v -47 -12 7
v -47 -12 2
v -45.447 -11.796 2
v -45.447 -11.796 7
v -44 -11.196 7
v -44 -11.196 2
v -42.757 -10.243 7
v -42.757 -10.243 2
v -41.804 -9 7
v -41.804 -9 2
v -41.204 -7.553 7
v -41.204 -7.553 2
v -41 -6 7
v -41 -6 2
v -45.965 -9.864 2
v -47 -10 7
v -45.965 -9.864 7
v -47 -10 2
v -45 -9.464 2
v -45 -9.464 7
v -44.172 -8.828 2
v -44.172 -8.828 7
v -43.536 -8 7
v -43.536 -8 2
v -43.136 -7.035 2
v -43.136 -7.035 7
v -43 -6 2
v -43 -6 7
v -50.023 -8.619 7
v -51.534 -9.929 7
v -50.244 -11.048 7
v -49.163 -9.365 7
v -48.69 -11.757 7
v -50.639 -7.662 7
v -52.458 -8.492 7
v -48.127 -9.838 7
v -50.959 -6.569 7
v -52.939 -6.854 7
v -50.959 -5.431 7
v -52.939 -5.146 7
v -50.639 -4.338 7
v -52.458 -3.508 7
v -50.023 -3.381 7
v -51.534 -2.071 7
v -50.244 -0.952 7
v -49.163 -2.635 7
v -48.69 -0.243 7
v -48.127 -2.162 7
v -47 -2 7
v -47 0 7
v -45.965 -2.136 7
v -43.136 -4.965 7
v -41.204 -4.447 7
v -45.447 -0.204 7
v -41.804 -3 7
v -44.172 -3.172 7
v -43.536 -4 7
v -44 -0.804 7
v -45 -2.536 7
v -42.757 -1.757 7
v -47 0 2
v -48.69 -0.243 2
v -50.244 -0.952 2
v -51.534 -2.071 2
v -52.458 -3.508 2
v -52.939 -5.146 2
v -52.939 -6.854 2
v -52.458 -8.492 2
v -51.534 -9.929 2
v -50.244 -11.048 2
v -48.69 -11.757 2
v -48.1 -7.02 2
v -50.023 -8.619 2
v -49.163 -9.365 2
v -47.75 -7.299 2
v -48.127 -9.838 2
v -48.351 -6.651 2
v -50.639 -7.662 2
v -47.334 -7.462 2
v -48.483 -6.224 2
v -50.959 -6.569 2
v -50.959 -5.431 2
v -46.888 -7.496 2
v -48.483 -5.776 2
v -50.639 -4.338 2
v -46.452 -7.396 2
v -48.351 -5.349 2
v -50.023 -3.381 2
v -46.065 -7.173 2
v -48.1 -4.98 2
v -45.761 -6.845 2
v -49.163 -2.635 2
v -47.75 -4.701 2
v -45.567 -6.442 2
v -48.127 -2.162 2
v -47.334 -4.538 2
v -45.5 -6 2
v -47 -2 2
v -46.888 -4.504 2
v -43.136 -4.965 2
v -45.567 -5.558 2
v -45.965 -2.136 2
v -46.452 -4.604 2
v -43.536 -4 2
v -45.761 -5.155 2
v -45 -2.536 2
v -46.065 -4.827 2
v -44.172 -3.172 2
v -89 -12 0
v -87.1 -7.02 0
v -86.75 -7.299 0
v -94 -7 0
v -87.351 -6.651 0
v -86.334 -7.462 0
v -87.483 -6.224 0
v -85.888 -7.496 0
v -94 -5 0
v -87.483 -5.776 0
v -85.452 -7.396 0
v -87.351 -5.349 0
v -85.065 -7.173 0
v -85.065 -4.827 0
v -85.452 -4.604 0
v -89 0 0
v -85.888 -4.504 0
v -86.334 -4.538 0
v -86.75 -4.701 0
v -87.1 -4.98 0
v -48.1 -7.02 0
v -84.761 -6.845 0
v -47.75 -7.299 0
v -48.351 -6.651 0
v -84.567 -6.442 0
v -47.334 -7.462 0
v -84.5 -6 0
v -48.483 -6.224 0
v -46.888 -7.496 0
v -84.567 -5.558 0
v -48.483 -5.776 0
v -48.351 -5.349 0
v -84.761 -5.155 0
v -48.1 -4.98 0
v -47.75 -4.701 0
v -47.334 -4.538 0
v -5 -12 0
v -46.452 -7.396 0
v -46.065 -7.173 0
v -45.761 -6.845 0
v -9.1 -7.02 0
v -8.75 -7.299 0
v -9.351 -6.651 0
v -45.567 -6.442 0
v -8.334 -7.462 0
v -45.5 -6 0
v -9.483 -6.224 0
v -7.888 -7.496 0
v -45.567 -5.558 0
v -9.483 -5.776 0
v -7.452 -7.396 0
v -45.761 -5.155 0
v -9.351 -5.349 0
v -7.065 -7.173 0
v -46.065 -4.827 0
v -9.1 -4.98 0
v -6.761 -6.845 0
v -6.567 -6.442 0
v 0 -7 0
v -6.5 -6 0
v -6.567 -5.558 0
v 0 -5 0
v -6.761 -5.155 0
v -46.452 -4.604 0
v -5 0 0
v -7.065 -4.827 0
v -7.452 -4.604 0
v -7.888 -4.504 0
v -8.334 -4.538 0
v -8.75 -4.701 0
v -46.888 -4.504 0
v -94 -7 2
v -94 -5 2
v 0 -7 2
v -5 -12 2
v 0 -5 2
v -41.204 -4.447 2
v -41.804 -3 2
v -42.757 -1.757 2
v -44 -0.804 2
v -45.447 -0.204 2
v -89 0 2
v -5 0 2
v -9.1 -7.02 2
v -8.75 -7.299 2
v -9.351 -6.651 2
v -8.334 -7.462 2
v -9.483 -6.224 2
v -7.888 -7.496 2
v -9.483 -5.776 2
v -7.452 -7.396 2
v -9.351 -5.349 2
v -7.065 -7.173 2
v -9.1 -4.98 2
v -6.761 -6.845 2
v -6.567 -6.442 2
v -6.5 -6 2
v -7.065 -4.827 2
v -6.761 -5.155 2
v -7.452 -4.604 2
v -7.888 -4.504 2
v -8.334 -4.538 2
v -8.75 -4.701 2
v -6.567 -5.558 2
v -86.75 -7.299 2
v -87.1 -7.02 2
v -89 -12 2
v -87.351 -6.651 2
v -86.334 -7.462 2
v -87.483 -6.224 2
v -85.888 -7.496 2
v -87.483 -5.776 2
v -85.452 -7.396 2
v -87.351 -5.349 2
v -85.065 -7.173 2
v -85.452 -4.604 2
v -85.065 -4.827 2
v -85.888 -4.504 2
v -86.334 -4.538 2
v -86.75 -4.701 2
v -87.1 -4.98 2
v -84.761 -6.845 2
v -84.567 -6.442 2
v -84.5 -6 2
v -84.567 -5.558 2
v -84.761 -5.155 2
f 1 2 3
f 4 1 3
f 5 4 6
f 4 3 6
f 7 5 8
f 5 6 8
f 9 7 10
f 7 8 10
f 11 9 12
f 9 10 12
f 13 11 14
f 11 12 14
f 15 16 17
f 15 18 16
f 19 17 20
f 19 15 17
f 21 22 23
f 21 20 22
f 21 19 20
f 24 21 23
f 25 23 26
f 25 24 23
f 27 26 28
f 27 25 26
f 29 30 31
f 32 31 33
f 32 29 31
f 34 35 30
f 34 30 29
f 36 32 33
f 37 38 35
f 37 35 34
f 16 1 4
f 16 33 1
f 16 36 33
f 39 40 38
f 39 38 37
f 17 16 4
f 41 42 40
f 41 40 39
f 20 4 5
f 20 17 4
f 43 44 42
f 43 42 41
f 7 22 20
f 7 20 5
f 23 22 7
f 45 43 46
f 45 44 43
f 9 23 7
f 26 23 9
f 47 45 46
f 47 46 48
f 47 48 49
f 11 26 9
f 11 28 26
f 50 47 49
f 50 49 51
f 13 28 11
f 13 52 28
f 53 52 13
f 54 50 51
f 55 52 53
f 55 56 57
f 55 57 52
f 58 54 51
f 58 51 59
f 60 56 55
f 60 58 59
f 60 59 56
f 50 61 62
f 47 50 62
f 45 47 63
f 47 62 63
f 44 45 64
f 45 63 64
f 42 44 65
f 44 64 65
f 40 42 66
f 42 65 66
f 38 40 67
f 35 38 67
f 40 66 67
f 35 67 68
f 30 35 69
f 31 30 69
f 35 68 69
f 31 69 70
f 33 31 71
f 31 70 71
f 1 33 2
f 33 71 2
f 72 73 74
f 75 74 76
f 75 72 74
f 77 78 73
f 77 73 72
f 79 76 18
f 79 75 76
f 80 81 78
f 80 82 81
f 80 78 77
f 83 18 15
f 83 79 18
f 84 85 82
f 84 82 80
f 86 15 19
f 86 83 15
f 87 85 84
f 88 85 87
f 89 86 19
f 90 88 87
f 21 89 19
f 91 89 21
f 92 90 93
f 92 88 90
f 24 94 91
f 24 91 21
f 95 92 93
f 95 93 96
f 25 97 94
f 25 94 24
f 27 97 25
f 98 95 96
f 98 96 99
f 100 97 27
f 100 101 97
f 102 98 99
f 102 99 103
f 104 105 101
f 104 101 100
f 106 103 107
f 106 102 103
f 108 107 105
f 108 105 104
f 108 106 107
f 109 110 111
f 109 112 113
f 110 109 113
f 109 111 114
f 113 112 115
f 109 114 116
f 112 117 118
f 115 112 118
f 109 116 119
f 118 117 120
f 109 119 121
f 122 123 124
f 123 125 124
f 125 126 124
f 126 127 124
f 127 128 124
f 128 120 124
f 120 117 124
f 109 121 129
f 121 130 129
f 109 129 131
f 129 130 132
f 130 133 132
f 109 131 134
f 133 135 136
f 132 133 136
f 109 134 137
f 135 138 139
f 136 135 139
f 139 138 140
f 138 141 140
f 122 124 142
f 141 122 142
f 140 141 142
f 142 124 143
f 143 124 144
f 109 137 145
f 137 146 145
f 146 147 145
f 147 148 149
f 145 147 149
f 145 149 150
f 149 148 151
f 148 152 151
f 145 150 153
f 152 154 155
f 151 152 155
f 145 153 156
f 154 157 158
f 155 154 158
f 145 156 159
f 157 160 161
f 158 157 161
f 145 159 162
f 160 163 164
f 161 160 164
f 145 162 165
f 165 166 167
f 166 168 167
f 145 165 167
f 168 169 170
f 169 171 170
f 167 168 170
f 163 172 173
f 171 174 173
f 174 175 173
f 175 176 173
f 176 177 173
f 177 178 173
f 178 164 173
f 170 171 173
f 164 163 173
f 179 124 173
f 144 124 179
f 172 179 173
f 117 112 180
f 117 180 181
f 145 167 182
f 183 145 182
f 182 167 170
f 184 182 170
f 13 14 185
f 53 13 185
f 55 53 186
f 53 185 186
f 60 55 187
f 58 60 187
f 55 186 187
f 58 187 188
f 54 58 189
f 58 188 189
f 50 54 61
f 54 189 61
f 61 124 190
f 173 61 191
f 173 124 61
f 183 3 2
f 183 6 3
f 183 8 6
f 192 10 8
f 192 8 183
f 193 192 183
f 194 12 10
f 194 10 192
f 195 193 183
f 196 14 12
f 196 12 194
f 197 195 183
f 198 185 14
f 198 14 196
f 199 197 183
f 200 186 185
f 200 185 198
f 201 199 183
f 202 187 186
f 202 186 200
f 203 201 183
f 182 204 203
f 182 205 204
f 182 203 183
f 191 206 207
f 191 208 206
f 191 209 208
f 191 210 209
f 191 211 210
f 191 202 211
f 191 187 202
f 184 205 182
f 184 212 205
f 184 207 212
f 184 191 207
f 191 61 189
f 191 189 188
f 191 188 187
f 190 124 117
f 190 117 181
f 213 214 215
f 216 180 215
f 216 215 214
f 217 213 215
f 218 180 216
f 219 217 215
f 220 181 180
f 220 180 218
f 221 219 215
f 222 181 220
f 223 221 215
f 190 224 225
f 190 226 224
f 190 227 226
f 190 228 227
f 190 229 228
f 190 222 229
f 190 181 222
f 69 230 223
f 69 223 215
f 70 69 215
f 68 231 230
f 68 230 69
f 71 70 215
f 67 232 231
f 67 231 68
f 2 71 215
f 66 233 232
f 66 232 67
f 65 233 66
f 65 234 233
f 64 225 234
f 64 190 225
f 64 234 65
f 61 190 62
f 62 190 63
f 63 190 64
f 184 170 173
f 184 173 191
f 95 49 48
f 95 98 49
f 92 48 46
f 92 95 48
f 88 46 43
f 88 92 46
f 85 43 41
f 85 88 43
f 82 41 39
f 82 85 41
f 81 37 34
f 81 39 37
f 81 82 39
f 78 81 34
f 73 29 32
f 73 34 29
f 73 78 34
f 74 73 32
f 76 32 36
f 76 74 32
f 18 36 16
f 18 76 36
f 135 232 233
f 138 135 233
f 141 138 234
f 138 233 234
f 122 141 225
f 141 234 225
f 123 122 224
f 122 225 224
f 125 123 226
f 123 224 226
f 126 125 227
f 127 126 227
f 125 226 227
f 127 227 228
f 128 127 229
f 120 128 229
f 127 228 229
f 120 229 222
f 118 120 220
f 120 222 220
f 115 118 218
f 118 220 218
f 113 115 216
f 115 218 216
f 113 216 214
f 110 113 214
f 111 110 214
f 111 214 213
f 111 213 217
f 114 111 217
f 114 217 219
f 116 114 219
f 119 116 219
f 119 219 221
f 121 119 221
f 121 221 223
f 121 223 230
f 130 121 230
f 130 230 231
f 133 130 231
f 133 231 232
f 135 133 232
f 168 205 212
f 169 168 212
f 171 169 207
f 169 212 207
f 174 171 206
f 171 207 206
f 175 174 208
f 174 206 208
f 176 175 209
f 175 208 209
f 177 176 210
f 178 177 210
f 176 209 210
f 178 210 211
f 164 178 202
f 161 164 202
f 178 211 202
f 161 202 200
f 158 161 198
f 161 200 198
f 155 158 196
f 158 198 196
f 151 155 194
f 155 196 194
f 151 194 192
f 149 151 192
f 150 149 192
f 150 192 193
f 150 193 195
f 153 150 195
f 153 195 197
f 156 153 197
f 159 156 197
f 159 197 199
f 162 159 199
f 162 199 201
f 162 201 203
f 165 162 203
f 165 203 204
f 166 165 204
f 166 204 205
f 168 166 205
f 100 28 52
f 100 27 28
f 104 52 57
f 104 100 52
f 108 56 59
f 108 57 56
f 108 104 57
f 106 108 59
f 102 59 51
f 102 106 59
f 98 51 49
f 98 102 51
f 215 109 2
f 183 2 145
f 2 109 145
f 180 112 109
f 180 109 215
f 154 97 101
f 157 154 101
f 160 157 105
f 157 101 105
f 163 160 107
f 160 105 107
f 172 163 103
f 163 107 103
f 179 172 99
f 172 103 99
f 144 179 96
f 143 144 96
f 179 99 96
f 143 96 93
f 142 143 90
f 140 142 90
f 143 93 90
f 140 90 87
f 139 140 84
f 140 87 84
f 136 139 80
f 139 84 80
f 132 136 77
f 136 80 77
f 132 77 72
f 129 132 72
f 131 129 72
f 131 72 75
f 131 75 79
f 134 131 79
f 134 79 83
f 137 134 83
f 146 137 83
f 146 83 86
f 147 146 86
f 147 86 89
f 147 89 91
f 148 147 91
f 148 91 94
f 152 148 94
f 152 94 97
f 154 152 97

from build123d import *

# Parameters (mm, degrees)
F0_W     = 94
F0_H     = 12
F1_DEPTH = 2
F3_DEPTH = 5
F4_T     = -2
F5_SIZE  = 5
F6_R     = 1.5
F7_DEPTH = 25
F8_R     = 1.5
F9_DEPTH = 25


with BuildPart() as f1:
    # F0 (on Top) → F1 (new body)
    with BuildSketch(Plane.XY):
        with Locations((-47, -6)):
            Rectangle(F0_W, F0_H)
    extrude(amount=F1_DEPTH)

    # F2 (on face) → F3 (join)
    with BuildSketch(Plane.XY.offset(2)):
        with BuildLine():
            ThreePointArc((-47, -12), (-42.7573593129, -10.2426406871), (-41, -6))
            ThreePointArc((-41, -6), (-42.7573593129, -1.7573593129), (-47, 0))
            ThreePointArc((-47, 0), (-53, -6), (-47, -12))
        make_face()
    extrude(amount=F3_DEPTH)

    # F4
    f4_openings = [f1.faces().sort_by_distance(p)[0] for p in [
        (-47, -6, 7),
    ]]
    offset(amount=F4_T, openings=f4_openings, kind=Kind.INTERSECTION)

    # F5
    f5_edges = [f1.edges().sort_by_distance(p)[0] for p in [
        (-94, -12, 1),
        (-94, 0, 1),
        (0, 0, 1),
        (0, -12, 1),
    ]]
    chamfer(f5_edges, length=F5_SIZE)

    # F6 (on face) → F7 (cut)
    with BuildSketch(Plane.XY.offset(2)):
        with Locations((-47, -6)):
            Circle(F6_R)
    extrude(amount=-F7_DEPTH, mode=Mode.SUBTRACT)

    # F8 (on face) → F9 (cut)
    with BuildSketch(Plane.XY.offset(2)):
        with Locations((-8, -6)):
            Circle(F8_R)
        with Locations((-86, -6)):
            Circle(F8_R)
    extrude(amount=-F9_DEPTH, mode=Mode.SUBTRACT)


solid = f1.part
